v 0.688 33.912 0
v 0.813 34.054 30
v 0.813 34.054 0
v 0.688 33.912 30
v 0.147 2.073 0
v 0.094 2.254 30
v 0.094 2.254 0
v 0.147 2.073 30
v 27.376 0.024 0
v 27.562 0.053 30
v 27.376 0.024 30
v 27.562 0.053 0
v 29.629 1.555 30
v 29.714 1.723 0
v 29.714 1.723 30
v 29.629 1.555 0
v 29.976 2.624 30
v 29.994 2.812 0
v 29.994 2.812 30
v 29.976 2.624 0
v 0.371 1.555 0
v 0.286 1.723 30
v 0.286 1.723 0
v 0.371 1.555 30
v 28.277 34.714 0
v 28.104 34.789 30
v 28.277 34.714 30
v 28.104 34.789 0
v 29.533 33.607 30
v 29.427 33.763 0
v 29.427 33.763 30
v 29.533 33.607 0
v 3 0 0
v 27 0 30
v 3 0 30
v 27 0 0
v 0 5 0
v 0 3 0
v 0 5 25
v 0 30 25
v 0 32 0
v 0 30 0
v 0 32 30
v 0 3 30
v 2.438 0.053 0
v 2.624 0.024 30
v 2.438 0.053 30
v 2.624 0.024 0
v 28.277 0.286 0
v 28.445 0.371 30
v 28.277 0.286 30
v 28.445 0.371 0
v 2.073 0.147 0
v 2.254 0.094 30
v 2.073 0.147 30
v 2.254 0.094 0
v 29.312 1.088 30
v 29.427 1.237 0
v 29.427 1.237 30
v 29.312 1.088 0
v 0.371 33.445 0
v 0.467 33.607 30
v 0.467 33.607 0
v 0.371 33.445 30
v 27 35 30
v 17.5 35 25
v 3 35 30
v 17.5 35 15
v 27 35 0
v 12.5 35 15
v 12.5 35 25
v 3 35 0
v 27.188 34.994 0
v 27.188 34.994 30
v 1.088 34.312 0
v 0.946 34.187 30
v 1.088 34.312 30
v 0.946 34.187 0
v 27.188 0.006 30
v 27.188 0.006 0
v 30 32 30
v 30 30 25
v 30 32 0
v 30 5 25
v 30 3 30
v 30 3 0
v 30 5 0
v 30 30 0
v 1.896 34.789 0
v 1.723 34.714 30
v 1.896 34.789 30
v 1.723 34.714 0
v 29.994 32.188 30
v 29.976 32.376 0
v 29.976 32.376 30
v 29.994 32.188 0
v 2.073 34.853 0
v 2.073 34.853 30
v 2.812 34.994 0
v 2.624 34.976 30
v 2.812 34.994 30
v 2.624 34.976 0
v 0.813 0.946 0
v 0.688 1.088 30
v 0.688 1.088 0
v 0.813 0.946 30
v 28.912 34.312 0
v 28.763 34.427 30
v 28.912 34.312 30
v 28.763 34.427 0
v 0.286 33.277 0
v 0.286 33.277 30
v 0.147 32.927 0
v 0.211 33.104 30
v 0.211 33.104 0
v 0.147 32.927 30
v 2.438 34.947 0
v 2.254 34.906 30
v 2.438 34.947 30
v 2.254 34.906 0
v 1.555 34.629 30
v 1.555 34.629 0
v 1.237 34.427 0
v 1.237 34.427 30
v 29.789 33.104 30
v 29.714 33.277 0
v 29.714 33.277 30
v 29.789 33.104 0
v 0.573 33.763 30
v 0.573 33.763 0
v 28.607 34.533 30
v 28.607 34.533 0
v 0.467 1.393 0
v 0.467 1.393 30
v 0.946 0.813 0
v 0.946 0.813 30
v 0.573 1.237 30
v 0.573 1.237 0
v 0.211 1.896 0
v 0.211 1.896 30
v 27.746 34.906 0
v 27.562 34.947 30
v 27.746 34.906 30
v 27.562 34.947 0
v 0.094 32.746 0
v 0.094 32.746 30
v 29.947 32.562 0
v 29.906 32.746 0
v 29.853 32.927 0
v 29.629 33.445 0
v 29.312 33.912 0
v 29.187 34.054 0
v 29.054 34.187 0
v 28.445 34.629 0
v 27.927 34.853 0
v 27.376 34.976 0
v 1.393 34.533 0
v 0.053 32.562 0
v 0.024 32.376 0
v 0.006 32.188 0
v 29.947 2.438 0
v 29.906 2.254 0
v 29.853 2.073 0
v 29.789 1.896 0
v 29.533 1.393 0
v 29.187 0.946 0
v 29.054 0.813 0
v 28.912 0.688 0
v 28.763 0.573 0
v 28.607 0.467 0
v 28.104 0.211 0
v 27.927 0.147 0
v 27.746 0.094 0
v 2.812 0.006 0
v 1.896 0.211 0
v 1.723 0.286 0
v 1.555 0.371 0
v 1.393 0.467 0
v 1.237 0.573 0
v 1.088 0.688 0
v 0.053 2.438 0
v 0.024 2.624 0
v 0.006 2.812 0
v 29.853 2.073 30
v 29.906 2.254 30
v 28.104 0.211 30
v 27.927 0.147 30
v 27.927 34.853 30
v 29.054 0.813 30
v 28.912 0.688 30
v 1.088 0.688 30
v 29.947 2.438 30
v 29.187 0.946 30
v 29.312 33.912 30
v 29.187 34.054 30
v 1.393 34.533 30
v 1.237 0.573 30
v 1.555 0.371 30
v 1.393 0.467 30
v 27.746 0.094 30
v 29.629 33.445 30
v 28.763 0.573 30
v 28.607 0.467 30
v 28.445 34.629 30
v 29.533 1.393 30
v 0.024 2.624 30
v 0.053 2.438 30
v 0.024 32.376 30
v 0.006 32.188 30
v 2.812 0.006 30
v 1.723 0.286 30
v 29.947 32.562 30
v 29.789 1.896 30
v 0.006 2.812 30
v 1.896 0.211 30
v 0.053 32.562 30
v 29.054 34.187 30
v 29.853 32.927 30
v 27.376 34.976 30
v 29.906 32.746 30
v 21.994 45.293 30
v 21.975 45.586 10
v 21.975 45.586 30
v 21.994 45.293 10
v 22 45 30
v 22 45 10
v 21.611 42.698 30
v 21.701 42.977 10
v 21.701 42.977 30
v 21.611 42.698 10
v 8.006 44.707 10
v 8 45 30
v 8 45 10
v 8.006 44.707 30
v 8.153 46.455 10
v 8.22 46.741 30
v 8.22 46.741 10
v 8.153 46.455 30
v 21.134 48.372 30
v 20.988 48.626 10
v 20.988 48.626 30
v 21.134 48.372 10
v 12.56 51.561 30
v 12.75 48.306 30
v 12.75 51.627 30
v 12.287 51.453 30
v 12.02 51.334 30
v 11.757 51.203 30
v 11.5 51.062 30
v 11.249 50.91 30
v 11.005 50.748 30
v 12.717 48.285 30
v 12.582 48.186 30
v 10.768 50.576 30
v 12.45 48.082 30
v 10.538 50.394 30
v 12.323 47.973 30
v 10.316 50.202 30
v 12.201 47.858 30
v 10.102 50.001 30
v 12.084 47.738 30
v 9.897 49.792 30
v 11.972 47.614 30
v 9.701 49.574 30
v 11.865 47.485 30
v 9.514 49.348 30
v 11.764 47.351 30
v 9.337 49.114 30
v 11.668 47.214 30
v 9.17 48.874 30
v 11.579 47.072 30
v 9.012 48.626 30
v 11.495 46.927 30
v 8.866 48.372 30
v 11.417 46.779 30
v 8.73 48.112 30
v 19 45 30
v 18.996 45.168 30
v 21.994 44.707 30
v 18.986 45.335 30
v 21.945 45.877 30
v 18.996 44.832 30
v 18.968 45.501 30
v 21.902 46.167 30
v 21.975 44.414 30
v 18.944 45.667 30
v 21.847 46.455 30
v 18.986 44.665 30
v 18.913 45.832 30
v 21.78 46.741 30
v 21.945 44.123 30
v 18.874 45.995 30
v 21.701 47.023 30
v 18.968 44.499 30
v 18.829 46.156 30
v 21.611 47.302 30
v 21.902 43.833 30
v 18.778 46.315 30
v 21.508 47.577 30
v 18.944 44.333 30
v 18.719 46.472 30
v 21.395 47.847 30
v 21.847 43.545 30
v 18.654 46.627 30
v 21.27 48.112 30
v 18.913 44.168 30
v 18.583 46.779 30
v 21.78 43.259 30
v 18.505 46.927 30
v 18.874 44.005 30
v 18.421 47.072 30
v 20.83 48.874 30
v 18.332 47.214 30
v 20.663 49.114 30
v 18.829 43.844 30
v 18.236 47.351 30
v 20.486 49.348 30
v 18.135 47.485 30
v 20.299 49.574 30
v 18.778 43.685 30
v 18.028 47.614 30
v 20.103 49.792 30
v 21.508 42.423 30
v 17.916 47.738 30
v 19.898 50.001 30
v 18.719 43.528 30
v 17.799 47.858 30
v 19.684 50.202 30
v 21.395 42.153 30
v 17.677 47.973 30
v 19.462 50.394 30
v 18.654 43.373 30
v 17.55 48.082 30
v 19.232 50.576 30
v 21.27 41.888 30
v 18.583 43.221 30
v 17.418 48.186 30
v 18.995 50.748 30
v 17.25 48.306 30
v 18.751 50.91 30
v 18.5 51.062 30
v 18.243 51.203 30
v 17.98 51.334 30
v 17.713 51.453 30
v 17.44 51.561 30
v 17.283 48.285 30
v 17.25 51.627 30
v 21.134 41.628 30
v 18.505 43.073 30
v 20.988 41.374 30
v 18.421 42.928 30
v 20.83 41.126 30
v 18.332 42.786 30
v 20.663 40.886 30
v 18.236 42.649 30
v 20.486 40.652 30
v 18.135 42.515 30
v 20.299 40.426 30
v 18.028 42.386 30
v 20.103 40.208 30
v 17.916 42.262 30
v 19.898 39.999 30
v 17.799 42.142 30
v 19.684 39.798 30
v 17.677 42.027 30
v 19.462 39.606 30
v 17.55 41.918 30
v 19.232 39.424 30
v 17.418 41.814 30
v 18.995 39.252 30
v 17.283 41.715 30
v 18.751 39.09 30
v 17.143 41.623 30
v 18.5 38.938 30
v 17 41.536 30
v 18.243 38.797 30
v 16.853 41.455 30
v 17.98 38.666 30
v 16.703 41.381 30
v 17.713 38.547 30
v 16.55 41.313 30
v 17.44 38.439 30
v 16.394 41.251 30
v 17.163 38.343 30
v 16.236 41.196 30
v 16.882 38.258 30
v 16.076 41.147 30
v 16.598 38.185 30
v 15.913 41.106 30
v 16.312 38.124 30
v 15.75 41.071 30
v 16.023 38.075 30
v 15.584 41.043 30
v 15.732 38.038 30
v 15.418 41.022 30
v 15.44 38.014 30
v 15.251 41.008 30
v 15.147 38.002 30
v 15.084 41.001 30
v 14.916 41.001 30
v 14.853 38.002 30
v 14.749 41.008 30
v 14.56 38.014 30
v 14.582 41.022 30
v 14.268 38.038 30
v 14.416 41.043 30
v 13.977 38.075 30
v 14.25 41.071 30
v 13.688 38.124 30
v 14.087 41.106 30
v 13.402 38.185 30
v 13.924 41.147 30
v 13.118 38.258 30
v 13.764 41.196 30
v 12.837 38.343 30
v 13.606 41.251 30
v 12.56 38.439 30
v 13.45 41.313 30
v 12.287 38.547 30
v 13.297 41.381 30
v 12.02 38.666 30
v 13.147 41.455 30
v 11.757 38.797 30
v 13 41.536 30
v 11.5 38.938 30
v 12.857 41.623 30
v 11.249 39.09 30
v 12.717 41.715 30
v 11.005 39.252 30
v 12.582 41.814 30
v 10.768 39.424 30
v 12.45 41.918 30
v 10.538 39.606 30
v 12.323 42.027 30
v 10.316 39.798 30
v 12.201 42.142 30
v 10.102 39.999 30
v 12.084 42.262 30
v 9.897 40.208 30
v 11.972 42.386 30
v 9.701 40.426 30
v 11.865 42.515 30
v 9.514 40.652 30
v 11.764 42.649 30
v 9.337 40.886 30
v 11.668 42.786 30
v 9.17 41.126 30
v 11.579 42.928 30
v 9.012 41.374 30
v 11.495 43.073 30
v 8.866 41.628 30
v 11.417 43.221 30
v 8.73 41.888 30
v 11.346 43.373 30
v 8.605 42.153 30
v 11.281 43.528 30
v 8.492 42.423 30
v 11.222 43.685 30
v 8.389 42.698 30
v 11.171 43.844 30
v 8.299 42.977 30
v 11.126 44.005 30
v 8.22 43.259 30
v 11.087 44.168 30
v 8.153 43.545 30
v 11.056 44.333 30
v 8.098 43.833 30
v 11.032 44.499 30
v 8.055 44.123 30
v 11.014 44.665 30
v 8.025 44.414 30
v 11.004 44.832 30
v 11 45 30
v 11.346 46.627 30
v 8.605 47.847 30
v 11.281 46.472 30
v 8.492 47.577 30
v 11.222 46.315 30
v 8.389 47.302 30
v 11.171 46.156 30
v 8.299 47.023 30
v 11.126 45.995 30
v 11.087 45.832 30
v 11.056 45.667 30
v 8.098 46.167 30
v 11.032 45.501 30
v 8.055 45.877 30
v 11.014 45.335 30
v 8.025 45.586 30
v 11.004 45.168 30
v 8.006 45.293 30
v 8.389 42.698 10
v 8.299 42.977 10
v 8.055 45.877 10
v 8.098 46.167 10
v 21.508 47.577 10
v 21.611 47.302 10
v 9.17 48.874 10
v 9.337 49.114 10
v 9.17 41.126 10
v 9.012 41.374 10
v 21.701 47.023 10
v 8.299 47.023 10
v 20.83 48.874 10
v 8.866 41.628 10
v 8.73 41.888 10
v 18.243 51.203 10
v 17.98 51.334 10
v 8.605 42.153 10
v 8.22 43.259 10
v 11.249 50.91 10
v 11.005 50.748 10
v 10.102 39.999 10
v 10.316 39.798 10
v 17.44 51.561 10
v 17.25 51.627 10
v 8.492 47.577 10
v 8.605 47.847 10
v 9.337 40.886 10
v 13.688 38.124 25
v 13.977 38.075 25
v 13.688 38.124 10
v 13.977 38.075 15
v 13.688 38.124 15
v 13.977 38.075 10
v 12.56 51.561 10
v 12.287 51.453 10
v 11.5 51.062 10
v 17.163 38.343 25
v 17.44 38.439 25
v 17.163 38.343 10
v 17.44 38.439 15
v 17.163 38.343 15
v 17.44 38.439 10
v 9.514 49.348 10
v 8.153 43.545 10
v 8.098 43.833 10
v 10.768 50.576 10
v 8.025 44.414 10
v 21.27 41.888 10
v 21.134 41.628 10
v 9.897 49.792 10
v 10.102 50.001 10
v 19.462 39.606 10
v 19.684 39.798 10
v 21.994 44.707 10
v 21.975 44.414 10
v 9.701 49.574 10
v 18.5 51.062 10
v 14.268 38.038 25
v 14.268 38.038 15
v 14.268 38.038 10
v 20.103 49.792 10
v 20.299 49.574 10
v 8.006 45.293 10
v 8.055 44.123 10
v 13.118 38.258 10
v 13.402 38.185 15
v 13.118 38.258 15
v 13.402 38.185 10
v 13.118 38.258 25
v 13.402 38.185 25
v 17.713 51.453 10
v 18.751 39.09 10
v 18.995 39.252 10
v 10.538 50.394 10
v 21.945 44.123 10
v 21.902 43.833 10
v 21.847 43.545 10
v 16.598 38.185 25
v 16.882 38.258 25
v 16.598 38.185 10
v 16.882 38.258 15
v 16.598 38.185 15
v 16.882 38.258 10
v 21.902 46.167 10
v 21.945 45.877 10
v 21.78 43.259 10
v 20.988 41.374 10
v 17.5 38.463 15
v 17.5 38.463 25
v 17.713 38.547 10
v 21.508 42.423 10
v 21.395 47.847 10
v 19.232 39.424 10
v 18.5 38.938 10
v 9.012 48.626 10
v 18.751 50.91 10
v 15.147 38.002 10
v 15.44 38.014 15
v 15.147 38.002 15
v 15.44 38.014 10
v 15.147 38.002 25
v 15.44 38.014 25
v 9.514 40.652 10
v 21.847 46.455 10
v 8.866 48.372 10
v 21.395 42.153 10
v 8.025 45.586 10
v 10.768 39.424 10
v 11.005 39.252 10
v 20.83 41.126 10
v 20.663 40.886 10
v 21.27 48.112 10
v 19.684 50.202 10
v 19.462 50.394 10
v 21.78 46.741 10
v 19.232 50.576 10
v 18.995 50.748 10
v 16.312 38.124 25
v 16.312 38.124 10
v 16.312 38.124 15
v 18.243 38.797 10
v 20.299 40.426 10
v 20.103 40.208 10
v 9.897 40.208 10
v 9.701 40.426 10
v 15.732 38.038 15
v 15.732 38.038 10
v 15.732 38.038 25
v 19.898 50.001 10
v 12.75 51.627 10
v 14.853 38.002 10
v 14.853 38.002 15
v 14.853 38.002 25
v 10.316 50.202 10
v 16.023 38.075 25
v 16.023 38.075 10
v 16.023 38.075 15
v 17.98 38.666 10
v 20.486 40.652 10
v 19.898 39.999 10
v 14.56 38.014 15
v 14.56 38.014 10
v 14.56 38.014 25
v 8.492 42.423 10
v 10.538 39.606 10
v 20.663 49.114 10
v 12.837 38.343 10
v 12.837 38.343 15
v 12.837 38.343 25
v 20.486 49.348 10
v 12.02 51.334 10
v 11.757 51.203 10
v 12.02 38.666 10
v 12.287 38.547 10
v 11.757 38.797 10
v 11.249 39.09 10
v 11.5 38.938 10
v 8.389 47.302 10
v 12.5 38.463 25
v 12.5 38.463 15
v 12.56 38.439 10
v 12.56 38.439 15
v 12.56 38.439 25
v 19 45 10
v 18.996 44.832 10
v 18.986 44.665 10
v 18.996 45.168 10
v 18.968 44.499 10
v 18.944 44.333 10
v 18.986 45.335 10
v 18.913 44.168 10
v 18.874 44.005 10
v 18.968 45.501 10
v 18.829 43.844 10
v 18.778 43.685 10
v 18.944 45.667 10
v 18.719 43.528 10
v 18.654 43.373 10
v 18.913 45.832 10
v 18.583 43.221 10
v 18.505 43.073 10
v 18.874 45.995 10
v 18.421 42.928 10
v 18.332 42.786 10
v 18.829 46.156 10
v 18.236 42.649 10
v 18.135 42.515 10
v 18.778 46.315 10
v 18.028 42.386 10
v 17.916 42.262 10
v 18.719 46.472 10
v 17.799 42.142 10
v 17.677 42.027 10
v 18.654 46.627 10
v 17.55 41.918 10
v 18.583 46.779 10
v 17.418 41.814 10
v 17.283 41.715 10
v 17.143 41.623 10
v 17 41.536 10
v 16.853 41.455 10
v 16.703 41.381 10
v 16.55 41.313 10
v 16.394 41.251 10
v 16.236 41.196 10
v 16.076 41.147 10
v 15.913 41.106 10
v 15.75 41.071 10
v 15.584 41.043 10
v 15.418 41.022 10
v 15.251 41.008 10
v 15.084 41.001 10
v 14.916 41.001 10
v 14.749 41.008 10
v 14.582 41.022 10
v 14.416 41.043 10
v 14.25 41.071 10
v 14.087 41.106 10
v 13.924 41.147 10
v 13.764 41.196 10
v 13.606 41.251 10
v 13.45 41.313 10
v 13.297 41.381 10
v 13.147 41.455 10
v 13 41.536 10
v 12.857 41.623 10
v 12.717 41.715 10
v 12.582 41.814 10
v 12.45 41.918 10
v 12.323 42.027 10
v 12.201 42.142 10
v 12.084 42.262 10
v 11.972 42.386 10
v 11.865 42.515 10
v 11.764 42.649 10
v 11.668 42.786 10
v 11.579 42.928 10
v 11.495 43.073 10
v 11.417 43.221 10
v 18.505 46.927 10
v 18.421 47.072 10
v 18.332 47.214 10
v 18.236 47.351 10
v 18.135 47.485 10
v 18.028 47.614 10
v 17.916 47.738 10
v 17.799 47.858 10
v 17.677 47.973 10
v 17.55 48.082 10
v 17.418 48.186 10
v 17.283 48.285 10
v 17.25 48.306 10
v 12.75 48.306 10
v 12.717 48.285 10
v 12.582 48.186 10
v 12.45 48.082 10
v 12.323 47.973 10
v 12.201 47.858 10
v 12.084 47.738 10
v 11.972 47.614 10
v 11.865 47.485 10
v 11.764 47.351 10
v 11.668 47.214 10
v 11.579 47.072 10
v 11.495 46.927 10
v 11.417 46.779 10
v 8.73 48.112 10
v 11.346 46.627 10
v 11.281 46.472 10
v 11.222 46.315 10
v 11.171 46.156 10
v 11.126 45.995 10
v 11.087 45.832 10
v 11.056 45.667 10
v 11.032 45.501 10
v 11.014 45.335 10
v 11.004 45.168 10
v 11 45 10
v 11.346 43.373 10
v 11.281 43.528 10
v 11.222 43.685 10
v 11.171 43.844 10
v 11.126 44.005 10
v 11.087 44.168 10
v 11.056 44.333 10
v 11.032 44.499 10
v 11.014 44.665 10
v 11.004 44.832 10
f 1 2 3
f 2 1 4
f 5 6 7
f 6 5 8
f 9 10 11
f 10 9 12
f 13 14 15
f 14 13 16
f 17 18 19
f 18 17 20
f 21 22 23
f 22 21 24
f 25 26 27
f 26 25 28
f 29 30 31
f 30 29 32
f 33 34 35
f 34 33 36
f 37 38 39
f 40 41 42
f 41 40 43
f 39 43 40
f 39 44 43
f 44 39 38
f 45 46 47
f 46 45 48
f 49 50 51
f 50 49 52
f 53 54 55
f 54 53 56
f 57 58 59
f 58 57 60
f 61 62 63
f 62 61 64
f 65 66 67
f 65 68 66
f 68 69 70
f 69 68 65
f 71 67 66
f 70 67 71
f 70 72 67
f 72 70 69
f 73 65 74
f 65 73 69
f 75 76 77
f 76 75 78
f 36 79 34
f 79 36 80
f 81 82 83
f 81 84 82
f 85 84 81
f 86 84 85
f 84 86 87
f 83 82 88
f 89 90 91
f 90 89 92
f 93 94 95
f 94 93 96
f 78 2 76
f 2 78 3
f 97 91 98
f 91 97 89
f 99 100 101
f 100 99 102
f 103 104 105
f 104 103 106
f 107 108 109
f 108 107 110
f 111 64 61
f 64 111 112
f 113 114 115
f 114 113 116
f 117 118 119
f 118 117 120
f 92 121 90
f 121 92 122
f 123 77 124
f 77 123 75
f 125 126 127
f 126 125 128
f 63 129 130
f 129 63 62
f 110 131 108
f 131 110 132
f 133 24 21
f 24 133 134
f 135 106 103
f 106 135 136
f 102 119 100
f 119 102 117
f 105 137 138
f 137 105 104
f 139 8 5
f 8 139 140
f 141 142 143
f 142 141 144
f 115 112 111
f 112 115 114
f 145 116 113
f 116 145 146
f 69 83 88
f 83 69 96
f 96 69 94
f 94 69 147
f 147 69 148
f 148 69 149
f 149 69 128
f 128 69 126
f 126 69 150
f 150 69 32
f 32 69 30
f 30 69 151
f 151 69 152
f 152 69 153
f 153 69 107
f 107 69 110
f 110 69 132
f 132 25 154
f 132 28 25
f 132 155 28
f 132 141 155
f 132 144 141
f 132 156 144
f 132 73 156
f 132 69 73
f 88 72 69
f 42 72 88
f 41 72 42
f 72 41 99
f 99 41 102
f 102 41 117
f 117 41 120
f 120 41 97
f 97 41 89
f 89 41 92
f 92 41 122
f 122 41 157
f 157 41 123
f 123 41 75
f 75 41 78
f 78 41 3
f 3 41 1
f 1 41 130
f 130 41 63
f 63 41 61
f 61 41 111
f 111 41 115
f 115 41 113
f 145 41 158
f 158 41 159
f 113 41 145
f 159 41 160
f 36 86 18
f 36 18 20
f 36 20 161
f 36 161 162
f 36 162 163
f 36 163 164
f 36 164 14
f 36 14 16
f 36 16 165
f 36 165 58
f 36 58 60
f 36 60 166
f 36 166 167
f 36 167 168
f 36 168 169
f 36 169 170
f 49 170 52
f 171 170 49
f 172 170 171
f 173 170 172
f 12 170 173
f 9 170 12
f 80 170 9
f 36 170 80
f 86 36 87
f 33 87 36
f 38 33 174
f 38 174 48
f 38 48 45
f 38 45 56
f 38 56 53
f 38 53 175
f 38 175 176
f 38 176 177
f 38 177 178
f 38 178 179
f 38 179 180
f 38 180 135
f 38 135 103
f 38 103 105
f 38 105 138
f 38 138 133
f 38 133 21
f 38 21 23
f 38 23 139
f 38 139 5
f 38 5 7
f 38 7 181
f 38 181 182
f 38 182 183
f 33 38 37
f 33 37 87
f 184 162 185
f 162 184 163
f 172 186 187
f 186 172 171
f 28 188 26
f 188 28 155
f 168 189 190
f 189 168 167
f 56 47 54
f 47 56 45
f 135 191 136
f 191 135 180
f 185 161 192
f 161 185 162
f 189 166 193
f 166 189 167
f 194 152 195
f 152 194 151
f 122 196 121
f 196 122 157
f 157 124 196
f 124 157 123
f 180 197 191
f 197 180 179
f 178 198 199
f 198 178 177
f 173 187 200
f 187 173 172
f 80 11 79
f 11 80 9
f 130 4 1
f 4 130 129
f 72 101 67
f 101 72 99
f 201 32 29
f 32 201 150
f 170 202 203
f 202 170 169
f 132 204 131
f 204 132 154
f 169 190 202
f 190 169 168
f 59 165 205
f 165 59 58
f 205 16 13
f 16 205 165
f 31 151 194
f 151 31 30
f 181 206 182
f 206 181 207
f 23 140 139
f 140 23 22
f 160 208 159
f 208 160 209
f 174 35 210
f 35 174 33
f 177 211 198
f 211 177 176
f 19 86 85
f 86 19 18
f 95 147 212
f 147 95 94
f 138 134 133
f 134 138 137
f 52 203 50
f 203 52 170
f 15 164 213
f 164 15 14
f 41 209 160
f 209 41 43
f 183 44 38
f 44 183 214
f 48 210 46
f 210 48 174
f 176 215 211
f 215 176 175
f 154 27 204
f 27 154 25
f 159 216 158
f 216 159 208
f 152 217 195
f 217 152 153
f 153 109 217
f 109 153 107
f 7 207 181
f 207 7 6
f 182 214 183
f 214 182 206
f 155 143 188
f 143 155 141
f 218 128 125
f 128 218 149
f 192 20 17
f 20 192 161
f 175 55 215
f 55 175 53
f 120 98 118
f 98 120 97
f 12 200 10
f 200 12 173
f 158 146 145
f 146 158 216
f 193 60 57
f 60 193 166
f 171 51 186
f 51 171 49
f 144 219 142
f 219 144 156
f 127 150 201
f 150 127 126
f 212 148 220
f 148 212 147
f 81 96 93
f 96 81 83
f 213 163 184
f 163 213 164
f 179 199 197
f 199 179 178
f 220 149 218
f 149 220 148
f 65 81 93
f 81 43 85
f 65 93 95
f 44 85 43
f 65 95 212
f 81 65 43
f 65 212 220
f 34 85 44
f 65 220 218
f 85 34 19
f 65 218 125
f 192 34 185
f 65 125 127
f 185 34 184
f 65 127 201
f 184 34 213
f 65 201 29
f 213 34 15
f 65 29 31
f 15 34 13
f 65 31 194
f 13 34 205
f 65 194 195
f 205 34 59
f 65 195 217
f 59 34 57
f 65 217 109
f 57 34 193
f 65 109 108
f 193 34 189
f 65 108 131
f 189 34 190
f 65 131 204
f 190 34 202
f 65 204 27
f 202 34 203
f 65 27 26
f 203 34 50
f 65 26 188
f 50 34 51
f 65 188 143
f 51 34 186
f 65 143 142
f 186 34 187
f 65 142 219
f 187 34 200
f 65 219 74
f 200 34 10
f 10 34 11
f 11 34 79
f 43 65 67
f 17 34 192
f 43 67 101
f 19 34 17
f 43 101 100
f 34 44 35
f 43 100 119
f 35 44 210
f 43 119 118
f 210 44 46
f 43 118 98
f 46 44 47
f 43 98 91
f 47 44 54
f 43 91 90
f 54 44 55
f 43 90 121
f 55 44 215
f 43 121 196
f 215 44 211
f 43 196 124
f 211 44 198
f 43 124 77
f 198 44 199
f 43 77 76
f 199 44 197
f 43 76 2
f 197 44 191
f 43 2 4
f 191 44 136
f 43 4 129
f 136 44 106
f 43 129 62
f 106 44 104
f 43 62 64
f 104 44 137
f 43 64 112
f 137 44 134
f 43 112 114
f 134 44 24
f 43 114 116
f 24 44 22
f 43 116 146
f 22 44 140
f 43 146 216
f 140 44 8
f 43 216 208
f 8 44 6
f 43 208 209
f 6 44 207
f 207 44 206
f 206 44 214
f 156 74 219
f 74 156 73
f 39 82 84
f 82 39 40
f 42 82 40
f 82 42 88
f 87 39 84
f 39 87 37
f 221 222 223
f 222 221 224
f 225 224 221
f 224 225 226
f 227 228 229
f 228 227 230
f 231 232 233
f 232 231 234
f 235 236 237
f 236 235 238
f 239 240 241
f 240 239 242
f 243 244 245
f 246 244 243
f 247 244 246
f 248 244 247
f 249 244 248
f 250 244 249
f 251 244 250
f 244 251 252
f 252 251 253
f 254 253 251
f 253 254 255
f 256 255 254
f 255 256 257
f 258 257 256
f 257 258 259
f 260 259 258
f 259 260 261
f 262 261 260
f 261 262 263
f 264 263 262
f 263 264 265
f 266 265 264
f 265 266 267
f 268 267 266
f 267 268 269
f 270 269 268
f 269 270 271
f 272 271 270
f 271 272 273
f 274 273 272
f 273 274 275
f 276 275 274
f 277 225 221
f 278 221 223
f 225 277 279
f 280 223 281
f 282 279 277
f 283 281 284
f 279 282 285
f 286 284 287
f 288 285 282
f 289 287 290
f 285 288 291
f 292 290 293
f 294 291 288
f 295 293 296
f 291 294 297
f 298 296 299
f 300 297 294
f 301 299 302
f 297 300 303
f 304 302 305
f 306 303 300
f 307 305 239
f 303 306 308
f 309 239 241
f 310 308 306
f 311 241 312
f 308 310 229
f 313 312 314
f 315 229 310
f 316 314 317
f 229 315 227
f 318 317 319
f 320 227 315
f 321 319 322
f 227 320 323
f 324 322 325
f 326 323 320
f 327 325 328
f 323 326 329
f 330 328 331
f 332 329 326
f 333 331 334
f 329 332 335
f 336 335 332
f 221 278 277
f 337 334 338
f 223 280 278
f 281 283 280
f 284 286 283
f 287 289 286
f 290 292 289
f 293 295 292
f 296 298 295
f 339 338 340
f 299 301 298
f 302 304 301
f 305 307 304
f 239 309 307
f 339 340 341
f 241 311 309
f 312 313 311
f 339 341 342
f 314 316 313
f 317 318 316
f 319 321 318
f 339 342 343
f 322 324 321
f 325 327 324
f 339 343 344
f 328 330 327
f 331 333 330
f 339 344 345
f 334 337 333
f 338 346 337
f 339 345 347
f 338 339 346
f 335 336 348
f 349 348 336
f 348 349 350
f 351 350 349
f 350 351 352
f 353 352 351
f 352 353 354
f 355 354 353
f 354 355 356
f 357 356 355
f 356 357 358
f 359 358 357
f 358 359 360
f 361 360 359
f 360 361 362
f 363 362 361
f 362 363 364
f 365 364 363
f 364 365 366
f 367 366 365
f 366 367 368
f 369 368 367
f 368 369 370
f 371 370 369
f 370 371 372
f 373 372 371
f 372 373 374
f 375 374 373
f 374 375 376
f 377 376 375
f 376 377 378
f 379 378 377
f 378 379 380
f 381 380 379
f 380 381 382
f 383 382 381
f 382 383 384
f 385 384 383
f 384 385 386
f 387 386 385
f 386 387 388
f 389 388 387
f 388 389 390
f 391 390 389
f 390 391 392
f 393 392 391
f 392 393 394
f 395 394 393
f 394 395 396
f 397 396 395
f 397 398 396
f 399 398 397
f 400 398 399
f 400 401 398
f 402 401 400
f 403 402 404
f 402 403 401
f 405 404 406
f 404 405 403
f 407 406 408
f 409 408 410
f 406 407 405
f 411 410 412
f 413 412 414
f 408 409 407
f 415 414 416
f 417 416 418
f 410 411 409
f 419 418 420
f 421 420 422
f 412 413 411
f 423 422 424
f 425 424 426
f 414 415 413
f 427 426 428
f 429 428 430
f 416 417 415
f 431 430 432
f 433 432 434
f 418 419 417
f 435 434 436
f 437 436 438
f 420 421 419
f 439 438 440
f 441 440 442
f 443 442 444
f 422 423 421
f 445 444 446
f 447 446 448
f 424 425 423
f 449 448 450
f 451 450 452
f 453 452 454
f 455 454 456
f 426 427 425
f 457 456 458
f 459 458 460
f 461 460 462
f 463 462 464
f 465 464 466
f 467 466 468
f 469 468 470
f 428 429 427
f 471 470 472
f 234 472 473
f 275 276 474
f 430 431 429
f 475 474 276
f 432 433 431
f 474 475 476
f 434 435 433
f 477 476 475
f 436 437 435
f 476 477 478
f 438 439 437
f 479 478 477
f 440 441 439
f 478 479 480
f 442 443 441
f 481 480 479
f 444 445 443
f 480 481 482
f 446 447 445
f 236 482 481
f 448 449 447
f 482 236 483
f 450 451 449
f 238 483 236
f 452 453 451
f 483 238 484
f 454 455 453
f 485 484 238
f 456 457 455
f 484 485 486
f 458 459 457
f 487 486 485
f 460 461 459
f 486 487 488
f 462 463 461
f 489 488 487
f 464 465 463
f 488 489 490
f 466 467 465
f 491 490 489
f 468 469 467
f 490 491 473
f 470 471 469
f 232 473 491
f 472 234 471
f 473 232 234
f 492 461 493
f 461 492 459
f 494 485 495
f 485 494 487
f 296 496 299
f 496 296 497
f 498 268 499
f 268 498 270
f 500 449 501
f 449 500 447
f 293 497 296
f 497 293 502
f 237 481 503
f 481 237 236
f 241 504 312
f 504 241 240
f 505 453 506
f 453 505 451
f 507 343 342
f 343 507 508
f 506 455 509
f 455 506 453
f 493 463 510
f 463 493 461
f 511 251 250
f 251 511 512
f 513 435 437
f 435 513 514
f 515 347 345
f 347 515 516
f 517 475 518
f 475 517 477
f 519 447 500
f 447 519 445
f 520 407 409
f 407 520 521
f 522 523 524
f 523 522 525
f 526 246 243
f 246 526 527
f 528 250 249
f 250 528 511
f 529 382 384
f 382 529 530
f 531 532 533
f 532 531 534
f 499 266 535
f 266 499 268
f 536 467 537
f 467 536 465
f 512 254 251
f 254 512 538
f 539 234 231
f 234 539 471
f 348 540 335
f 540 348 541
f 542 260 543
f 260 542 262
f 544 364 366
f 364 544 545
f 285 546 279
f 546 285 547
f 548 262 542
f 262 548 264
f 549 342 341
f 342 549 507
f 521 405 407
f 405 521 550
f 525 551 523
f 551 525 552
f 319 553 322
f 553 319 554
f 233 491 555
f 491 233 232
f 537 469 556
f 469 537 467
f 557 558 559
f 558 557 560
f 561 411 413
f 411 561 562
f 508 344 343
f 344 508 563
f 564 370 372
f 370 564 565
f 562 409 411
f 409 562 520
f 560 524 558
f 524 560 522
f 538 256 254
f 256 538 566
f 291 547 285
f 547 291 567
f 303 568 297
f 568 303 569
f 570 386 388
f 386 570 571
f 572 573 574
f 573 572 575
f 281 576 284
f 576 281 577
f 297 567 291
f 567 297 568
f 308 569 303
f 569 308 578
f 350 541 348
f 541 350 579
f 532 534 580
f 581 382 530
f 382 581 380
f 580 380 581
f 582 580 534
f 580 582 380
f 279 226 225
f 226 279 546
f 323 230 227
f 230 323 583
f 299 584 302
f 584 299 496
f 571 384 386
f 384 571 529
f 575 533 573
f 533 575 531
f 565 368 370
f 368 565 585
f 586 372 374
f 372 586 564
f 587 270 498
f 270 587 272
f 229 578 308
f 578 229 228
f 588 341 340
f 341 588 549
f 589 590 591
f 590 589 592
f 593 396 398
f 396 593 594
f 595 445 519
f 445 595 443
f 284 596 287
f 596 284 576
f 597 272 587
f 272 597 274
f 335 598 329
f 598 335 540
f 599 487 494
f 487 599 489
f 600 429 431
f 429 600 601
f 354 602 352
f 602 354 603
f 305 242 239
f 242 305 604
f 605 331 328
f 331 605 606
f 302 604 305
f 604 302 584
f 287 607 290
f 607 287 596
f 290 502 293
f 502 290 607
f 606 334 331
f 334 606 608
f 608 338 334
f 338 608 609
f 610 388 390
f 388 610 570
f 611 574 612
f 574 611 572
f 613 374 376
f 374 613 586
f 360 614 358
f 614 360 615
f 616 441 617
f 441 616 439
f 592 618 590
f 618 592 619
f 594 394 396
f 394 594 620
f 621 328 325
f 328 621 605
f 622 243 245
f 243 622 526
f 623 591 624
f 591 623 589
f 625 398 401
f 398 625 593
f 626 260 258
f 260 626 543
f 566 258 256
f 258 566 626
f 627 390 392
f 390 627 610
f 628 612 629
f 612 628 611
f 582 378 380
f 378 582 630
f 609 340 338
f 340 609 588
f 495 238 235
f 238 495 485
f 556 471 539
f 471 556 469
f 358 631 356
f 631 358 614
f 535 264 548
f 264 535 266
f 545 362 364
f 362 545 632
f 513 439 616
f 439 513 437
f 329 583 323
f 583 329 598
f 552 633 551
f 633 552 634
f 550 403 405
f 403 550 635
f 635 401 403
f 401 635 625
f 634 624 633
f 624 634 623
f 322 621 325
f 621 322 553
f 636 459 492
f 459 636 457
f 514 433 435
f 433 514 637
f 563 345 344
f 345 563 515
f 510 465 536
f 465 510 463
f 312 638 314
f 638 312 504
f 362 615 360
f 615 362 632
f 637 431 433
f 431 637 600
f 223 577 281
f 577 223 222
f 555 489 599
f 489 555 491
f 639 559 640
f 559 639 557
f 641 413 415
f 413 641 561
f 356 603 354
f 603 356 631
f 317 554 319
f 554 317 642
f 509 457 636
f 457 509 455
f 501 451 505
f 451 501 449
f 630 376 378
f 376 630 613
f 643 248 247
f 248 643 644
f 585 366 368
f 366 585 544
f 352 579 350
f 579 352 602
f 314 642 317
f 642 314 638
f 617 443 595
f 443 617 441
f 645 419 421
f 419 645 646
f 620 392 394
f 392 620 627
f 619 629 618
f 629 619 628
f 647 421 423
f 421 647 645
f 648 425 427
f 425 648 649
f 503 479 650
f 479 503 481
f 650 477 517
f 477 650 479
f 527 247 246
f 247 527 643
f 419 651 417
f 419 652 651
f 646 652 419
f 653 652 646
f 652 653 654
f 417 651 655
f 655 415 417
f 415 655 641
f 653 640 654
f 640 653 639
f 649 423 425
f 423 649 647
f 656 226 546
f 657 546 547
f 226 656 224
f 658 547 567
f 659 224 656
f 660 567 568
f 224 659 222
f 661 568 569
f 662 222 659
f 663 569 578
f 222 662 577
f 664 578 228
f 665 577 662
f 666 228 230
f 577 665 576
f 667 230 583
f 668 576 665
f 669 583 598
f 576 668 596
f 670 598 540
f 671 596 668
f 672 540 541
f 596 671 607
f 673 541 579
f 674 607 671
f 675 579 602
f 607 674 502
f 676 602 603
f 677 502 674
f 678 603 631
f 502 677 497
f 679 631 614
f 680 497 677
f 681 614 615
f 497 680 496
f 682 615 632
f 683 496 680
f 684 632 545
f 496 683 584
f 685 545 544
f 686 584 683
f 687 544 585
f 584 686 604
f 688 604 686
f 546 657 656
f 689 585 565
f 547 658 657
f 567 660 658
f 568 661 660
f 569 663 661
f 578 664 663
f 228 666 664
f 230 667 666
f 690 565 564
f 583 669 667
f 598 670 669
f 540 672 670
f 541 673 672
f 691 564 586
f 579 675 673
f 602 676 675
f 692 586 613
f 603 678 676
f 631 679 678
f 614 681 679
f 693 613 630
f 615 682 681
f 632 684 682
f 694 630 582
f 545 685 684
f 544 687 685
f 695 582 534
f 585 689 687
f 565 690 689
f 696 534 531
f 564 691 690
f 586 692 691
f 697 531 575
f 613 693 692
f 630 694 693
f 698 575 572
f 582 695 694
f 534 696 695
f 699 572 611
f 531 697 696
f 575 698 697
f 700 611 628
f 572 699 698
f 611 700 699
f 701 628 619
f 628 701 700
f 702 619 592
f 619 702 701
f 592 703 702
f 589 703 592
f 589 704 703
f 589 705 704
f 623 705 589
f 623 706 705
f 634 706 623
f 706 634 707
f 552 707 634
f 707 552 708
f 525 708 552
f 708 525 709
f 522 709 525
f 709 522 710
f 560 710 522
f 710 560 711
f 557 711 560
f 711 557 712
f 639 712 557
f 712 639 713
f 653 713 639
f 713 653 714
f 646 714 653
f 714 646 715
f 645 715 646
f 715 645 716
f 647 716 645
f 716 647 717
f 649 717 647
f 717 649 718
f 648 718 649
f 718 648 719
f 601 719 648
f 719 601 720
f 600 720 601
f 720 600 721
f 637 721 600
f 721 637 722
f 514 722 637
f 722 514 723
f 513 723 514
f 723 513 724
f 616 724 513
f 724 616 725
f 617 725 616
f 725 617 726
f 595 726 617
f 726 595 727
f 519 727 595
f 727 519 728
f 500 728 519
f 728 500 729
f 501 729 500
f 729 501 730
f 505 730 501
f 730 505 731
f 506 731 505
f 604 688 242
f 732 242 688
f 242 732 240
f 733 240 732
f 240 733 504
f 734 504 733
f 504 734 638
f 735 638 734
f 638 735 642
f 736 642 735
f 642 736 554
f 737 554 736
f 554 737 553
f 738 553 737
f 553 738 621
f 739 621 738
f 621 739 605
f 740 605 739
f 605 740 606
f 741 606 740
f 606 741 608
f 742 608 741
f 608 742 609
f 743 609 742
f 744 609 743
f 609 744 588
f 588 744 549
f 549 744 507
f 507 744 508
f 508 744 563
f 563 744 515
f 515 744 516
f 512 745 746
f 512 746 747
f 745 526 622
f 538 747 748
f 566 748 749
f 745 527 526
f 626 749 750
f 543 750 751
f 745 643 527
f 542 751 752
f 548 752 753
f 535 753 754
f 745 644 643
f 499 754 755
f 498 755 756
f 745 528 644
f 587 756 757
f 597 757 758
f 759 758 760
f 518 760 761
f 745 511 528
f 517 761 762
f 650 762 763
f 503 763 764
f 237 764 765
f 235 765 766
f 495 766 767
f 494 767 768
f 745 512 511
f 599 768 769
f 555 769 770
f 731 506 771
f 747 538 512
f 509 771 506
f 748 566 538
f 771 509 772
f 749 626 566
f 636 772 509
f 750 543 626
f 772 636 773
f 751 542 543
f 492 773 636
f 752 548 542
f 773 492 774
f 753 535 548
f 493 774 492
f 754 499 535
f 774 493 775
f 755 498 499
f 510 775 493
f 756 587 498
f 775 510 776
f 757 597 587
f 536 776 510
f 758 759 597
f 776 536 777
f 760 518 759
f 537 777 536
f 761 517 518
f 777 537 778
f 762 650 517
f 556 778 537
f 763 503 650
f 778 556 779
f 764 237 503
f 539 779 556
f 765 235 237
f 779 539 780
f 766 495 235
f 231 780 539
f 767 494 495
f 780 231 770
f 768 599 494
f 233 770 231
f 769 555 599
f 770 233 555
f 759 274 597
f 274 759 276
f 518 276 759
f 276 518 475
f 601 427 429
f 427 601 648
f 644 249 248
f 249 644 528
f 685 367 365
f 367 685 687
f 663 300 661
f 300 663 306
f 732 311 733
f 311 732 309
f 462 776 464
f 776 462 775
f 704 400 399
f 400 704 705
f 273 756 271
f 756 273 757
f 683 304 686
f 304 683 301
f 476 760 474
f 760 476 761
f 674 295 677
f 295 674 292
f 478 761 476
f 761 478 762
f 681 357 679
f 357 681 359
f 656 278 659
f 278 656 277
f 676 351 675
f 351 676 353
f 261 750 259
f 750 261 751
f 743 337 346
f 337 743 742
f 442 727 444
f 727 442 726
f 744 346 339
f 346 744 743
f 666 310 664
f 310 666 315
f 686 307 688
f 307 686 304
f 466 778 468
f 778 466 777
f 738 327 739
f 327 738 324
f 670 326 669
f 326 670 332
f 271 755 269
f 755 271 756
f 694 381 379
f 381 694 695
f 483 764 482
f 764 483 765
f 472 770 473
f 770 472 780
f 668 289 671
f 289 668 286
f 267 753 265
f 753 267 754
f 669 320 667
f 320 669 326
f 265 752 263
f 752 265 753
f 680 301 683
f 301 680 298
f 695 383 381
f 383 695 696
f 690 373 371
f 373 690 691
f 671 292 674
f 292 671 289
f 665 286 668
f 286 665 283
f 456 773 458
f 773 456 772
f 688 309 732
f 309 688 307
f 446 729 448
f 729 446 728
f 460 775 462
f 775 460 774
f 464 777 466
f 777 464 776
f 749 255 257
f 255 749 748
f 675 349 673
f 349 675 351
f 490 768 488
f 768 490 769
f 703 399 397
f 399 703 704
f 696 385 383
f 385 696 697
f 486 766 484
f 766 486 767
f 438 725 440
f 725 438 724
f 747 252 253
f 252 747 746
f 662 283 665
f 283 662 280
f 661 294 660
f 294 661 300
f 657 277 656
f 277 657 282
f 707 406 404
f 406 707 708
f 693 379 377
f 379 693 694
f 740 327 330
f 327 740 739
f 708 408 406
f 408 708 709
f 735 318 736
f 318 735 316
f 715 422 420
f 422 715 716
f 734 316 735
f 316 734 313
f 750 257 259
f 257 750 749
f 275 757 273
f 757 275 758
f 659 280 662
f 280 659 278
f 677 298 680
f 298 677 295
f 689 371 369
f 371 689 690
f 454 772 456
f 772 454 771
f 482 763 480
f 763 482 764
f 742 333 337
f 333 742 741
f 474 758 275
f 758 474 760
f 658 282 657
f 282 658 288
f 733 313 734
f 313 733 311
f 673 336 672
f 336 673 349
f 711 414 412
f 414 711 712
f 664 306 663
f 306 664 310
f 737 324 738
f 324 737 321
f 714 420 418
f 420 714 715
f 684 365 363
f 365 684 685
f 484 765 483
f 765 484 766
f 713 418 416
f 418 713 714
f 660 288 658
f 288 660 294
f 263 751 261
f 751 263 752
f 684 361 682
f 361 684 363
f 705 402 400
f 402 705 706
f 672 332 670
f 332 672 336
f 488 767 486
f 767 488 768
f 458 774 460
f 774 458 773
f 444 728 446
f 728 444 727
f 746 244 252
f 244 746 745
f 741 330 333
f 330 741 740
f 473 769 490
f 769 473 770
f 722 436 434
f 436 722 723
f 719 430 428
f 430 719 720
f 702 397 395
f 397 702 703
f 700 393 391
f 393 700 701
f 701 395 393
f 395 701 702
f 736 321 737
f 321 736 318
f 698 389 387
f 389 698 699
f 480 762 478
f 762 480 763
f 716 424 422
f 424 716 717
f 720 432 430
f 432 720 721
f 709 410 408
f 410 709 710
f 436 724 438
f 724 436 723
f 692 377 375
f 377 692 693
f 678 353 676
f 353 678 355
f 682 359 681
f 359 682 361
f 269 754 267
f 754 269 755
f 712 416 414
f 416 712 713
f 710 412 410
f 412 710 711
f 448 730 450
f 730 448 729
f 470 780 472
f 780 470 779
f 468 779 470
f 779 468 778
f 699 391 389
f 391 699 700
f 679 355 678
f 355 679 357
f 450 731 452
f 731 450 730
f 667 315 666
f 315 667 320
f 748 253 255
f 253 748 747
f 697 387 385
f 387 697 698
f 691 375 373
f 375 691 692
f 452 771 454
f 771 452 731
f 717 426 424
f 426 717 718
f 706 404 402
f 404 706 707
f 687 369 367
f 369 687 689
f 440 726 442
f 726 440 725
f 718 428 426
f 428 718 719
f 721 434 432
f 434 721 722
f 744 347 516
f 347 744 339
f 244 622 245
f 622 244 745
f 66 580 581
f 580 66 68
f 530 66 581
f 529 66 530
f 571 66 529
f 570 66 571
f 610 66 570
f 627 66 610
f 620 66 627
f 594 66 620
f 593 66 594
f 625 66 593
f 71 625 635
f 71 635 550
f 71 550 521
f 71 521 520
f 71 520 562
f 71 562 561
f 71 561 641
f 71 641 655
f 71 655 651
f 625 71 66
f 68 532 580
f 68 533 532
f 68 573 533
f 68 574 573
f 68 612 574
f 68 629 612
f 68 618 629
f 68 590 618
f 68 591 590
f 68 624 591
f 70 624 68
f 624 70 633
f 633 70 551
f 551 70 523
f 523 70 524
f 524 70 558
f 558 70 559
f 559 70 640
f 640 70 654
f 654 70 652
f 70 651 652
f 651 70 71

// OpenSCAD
res = 150;
dMiddle = 25;
dWallThickness = 5;
dHeight = 30;
dLength = 30;

dXOffsetHolder = dMiddle + (2*dWallThickness);

dHeightHolder = 20;

union() {
    
    // Main Clip
    difference() {
        cubeChamfer([dLength, dXOffsetHolder, dHeight], 3);
        translate([0, dWallThickness, 0]) cube([dLength, dMiddle, dHeight-dWallThickness]);
    }
    
    // Bridge to Holder
    translate([15-2.5, dXOffsetHolder, 15]) cube([5, 6, 10]);
    
    // Holder
    translate([15, dXOffsetHolder+5+5, 10]) difference()
    {
        cylinder(r =7, h = dHeightHolder, $fn=res);
        cylinder(r=4, h=dHeightHolder, $fn=res);
        xCube = 4.5;
        yCube = 7;
        translate([-0.5*xCube, 0, 0]) cube([xCube, yCube, dHeightHolder]);
    }

}

module cubeChamfer(xyz, radius)
{
    x = xyz[0] - 2*radius;
    y = xyz[1] - 2*radius;
    z = xyz[2] - 1;
    translate([radius, radius, 0]) minkowski() {
        cube([x, y, z]);
        cylinder(r=radius, h= 1, $fn=100);
    }
}
